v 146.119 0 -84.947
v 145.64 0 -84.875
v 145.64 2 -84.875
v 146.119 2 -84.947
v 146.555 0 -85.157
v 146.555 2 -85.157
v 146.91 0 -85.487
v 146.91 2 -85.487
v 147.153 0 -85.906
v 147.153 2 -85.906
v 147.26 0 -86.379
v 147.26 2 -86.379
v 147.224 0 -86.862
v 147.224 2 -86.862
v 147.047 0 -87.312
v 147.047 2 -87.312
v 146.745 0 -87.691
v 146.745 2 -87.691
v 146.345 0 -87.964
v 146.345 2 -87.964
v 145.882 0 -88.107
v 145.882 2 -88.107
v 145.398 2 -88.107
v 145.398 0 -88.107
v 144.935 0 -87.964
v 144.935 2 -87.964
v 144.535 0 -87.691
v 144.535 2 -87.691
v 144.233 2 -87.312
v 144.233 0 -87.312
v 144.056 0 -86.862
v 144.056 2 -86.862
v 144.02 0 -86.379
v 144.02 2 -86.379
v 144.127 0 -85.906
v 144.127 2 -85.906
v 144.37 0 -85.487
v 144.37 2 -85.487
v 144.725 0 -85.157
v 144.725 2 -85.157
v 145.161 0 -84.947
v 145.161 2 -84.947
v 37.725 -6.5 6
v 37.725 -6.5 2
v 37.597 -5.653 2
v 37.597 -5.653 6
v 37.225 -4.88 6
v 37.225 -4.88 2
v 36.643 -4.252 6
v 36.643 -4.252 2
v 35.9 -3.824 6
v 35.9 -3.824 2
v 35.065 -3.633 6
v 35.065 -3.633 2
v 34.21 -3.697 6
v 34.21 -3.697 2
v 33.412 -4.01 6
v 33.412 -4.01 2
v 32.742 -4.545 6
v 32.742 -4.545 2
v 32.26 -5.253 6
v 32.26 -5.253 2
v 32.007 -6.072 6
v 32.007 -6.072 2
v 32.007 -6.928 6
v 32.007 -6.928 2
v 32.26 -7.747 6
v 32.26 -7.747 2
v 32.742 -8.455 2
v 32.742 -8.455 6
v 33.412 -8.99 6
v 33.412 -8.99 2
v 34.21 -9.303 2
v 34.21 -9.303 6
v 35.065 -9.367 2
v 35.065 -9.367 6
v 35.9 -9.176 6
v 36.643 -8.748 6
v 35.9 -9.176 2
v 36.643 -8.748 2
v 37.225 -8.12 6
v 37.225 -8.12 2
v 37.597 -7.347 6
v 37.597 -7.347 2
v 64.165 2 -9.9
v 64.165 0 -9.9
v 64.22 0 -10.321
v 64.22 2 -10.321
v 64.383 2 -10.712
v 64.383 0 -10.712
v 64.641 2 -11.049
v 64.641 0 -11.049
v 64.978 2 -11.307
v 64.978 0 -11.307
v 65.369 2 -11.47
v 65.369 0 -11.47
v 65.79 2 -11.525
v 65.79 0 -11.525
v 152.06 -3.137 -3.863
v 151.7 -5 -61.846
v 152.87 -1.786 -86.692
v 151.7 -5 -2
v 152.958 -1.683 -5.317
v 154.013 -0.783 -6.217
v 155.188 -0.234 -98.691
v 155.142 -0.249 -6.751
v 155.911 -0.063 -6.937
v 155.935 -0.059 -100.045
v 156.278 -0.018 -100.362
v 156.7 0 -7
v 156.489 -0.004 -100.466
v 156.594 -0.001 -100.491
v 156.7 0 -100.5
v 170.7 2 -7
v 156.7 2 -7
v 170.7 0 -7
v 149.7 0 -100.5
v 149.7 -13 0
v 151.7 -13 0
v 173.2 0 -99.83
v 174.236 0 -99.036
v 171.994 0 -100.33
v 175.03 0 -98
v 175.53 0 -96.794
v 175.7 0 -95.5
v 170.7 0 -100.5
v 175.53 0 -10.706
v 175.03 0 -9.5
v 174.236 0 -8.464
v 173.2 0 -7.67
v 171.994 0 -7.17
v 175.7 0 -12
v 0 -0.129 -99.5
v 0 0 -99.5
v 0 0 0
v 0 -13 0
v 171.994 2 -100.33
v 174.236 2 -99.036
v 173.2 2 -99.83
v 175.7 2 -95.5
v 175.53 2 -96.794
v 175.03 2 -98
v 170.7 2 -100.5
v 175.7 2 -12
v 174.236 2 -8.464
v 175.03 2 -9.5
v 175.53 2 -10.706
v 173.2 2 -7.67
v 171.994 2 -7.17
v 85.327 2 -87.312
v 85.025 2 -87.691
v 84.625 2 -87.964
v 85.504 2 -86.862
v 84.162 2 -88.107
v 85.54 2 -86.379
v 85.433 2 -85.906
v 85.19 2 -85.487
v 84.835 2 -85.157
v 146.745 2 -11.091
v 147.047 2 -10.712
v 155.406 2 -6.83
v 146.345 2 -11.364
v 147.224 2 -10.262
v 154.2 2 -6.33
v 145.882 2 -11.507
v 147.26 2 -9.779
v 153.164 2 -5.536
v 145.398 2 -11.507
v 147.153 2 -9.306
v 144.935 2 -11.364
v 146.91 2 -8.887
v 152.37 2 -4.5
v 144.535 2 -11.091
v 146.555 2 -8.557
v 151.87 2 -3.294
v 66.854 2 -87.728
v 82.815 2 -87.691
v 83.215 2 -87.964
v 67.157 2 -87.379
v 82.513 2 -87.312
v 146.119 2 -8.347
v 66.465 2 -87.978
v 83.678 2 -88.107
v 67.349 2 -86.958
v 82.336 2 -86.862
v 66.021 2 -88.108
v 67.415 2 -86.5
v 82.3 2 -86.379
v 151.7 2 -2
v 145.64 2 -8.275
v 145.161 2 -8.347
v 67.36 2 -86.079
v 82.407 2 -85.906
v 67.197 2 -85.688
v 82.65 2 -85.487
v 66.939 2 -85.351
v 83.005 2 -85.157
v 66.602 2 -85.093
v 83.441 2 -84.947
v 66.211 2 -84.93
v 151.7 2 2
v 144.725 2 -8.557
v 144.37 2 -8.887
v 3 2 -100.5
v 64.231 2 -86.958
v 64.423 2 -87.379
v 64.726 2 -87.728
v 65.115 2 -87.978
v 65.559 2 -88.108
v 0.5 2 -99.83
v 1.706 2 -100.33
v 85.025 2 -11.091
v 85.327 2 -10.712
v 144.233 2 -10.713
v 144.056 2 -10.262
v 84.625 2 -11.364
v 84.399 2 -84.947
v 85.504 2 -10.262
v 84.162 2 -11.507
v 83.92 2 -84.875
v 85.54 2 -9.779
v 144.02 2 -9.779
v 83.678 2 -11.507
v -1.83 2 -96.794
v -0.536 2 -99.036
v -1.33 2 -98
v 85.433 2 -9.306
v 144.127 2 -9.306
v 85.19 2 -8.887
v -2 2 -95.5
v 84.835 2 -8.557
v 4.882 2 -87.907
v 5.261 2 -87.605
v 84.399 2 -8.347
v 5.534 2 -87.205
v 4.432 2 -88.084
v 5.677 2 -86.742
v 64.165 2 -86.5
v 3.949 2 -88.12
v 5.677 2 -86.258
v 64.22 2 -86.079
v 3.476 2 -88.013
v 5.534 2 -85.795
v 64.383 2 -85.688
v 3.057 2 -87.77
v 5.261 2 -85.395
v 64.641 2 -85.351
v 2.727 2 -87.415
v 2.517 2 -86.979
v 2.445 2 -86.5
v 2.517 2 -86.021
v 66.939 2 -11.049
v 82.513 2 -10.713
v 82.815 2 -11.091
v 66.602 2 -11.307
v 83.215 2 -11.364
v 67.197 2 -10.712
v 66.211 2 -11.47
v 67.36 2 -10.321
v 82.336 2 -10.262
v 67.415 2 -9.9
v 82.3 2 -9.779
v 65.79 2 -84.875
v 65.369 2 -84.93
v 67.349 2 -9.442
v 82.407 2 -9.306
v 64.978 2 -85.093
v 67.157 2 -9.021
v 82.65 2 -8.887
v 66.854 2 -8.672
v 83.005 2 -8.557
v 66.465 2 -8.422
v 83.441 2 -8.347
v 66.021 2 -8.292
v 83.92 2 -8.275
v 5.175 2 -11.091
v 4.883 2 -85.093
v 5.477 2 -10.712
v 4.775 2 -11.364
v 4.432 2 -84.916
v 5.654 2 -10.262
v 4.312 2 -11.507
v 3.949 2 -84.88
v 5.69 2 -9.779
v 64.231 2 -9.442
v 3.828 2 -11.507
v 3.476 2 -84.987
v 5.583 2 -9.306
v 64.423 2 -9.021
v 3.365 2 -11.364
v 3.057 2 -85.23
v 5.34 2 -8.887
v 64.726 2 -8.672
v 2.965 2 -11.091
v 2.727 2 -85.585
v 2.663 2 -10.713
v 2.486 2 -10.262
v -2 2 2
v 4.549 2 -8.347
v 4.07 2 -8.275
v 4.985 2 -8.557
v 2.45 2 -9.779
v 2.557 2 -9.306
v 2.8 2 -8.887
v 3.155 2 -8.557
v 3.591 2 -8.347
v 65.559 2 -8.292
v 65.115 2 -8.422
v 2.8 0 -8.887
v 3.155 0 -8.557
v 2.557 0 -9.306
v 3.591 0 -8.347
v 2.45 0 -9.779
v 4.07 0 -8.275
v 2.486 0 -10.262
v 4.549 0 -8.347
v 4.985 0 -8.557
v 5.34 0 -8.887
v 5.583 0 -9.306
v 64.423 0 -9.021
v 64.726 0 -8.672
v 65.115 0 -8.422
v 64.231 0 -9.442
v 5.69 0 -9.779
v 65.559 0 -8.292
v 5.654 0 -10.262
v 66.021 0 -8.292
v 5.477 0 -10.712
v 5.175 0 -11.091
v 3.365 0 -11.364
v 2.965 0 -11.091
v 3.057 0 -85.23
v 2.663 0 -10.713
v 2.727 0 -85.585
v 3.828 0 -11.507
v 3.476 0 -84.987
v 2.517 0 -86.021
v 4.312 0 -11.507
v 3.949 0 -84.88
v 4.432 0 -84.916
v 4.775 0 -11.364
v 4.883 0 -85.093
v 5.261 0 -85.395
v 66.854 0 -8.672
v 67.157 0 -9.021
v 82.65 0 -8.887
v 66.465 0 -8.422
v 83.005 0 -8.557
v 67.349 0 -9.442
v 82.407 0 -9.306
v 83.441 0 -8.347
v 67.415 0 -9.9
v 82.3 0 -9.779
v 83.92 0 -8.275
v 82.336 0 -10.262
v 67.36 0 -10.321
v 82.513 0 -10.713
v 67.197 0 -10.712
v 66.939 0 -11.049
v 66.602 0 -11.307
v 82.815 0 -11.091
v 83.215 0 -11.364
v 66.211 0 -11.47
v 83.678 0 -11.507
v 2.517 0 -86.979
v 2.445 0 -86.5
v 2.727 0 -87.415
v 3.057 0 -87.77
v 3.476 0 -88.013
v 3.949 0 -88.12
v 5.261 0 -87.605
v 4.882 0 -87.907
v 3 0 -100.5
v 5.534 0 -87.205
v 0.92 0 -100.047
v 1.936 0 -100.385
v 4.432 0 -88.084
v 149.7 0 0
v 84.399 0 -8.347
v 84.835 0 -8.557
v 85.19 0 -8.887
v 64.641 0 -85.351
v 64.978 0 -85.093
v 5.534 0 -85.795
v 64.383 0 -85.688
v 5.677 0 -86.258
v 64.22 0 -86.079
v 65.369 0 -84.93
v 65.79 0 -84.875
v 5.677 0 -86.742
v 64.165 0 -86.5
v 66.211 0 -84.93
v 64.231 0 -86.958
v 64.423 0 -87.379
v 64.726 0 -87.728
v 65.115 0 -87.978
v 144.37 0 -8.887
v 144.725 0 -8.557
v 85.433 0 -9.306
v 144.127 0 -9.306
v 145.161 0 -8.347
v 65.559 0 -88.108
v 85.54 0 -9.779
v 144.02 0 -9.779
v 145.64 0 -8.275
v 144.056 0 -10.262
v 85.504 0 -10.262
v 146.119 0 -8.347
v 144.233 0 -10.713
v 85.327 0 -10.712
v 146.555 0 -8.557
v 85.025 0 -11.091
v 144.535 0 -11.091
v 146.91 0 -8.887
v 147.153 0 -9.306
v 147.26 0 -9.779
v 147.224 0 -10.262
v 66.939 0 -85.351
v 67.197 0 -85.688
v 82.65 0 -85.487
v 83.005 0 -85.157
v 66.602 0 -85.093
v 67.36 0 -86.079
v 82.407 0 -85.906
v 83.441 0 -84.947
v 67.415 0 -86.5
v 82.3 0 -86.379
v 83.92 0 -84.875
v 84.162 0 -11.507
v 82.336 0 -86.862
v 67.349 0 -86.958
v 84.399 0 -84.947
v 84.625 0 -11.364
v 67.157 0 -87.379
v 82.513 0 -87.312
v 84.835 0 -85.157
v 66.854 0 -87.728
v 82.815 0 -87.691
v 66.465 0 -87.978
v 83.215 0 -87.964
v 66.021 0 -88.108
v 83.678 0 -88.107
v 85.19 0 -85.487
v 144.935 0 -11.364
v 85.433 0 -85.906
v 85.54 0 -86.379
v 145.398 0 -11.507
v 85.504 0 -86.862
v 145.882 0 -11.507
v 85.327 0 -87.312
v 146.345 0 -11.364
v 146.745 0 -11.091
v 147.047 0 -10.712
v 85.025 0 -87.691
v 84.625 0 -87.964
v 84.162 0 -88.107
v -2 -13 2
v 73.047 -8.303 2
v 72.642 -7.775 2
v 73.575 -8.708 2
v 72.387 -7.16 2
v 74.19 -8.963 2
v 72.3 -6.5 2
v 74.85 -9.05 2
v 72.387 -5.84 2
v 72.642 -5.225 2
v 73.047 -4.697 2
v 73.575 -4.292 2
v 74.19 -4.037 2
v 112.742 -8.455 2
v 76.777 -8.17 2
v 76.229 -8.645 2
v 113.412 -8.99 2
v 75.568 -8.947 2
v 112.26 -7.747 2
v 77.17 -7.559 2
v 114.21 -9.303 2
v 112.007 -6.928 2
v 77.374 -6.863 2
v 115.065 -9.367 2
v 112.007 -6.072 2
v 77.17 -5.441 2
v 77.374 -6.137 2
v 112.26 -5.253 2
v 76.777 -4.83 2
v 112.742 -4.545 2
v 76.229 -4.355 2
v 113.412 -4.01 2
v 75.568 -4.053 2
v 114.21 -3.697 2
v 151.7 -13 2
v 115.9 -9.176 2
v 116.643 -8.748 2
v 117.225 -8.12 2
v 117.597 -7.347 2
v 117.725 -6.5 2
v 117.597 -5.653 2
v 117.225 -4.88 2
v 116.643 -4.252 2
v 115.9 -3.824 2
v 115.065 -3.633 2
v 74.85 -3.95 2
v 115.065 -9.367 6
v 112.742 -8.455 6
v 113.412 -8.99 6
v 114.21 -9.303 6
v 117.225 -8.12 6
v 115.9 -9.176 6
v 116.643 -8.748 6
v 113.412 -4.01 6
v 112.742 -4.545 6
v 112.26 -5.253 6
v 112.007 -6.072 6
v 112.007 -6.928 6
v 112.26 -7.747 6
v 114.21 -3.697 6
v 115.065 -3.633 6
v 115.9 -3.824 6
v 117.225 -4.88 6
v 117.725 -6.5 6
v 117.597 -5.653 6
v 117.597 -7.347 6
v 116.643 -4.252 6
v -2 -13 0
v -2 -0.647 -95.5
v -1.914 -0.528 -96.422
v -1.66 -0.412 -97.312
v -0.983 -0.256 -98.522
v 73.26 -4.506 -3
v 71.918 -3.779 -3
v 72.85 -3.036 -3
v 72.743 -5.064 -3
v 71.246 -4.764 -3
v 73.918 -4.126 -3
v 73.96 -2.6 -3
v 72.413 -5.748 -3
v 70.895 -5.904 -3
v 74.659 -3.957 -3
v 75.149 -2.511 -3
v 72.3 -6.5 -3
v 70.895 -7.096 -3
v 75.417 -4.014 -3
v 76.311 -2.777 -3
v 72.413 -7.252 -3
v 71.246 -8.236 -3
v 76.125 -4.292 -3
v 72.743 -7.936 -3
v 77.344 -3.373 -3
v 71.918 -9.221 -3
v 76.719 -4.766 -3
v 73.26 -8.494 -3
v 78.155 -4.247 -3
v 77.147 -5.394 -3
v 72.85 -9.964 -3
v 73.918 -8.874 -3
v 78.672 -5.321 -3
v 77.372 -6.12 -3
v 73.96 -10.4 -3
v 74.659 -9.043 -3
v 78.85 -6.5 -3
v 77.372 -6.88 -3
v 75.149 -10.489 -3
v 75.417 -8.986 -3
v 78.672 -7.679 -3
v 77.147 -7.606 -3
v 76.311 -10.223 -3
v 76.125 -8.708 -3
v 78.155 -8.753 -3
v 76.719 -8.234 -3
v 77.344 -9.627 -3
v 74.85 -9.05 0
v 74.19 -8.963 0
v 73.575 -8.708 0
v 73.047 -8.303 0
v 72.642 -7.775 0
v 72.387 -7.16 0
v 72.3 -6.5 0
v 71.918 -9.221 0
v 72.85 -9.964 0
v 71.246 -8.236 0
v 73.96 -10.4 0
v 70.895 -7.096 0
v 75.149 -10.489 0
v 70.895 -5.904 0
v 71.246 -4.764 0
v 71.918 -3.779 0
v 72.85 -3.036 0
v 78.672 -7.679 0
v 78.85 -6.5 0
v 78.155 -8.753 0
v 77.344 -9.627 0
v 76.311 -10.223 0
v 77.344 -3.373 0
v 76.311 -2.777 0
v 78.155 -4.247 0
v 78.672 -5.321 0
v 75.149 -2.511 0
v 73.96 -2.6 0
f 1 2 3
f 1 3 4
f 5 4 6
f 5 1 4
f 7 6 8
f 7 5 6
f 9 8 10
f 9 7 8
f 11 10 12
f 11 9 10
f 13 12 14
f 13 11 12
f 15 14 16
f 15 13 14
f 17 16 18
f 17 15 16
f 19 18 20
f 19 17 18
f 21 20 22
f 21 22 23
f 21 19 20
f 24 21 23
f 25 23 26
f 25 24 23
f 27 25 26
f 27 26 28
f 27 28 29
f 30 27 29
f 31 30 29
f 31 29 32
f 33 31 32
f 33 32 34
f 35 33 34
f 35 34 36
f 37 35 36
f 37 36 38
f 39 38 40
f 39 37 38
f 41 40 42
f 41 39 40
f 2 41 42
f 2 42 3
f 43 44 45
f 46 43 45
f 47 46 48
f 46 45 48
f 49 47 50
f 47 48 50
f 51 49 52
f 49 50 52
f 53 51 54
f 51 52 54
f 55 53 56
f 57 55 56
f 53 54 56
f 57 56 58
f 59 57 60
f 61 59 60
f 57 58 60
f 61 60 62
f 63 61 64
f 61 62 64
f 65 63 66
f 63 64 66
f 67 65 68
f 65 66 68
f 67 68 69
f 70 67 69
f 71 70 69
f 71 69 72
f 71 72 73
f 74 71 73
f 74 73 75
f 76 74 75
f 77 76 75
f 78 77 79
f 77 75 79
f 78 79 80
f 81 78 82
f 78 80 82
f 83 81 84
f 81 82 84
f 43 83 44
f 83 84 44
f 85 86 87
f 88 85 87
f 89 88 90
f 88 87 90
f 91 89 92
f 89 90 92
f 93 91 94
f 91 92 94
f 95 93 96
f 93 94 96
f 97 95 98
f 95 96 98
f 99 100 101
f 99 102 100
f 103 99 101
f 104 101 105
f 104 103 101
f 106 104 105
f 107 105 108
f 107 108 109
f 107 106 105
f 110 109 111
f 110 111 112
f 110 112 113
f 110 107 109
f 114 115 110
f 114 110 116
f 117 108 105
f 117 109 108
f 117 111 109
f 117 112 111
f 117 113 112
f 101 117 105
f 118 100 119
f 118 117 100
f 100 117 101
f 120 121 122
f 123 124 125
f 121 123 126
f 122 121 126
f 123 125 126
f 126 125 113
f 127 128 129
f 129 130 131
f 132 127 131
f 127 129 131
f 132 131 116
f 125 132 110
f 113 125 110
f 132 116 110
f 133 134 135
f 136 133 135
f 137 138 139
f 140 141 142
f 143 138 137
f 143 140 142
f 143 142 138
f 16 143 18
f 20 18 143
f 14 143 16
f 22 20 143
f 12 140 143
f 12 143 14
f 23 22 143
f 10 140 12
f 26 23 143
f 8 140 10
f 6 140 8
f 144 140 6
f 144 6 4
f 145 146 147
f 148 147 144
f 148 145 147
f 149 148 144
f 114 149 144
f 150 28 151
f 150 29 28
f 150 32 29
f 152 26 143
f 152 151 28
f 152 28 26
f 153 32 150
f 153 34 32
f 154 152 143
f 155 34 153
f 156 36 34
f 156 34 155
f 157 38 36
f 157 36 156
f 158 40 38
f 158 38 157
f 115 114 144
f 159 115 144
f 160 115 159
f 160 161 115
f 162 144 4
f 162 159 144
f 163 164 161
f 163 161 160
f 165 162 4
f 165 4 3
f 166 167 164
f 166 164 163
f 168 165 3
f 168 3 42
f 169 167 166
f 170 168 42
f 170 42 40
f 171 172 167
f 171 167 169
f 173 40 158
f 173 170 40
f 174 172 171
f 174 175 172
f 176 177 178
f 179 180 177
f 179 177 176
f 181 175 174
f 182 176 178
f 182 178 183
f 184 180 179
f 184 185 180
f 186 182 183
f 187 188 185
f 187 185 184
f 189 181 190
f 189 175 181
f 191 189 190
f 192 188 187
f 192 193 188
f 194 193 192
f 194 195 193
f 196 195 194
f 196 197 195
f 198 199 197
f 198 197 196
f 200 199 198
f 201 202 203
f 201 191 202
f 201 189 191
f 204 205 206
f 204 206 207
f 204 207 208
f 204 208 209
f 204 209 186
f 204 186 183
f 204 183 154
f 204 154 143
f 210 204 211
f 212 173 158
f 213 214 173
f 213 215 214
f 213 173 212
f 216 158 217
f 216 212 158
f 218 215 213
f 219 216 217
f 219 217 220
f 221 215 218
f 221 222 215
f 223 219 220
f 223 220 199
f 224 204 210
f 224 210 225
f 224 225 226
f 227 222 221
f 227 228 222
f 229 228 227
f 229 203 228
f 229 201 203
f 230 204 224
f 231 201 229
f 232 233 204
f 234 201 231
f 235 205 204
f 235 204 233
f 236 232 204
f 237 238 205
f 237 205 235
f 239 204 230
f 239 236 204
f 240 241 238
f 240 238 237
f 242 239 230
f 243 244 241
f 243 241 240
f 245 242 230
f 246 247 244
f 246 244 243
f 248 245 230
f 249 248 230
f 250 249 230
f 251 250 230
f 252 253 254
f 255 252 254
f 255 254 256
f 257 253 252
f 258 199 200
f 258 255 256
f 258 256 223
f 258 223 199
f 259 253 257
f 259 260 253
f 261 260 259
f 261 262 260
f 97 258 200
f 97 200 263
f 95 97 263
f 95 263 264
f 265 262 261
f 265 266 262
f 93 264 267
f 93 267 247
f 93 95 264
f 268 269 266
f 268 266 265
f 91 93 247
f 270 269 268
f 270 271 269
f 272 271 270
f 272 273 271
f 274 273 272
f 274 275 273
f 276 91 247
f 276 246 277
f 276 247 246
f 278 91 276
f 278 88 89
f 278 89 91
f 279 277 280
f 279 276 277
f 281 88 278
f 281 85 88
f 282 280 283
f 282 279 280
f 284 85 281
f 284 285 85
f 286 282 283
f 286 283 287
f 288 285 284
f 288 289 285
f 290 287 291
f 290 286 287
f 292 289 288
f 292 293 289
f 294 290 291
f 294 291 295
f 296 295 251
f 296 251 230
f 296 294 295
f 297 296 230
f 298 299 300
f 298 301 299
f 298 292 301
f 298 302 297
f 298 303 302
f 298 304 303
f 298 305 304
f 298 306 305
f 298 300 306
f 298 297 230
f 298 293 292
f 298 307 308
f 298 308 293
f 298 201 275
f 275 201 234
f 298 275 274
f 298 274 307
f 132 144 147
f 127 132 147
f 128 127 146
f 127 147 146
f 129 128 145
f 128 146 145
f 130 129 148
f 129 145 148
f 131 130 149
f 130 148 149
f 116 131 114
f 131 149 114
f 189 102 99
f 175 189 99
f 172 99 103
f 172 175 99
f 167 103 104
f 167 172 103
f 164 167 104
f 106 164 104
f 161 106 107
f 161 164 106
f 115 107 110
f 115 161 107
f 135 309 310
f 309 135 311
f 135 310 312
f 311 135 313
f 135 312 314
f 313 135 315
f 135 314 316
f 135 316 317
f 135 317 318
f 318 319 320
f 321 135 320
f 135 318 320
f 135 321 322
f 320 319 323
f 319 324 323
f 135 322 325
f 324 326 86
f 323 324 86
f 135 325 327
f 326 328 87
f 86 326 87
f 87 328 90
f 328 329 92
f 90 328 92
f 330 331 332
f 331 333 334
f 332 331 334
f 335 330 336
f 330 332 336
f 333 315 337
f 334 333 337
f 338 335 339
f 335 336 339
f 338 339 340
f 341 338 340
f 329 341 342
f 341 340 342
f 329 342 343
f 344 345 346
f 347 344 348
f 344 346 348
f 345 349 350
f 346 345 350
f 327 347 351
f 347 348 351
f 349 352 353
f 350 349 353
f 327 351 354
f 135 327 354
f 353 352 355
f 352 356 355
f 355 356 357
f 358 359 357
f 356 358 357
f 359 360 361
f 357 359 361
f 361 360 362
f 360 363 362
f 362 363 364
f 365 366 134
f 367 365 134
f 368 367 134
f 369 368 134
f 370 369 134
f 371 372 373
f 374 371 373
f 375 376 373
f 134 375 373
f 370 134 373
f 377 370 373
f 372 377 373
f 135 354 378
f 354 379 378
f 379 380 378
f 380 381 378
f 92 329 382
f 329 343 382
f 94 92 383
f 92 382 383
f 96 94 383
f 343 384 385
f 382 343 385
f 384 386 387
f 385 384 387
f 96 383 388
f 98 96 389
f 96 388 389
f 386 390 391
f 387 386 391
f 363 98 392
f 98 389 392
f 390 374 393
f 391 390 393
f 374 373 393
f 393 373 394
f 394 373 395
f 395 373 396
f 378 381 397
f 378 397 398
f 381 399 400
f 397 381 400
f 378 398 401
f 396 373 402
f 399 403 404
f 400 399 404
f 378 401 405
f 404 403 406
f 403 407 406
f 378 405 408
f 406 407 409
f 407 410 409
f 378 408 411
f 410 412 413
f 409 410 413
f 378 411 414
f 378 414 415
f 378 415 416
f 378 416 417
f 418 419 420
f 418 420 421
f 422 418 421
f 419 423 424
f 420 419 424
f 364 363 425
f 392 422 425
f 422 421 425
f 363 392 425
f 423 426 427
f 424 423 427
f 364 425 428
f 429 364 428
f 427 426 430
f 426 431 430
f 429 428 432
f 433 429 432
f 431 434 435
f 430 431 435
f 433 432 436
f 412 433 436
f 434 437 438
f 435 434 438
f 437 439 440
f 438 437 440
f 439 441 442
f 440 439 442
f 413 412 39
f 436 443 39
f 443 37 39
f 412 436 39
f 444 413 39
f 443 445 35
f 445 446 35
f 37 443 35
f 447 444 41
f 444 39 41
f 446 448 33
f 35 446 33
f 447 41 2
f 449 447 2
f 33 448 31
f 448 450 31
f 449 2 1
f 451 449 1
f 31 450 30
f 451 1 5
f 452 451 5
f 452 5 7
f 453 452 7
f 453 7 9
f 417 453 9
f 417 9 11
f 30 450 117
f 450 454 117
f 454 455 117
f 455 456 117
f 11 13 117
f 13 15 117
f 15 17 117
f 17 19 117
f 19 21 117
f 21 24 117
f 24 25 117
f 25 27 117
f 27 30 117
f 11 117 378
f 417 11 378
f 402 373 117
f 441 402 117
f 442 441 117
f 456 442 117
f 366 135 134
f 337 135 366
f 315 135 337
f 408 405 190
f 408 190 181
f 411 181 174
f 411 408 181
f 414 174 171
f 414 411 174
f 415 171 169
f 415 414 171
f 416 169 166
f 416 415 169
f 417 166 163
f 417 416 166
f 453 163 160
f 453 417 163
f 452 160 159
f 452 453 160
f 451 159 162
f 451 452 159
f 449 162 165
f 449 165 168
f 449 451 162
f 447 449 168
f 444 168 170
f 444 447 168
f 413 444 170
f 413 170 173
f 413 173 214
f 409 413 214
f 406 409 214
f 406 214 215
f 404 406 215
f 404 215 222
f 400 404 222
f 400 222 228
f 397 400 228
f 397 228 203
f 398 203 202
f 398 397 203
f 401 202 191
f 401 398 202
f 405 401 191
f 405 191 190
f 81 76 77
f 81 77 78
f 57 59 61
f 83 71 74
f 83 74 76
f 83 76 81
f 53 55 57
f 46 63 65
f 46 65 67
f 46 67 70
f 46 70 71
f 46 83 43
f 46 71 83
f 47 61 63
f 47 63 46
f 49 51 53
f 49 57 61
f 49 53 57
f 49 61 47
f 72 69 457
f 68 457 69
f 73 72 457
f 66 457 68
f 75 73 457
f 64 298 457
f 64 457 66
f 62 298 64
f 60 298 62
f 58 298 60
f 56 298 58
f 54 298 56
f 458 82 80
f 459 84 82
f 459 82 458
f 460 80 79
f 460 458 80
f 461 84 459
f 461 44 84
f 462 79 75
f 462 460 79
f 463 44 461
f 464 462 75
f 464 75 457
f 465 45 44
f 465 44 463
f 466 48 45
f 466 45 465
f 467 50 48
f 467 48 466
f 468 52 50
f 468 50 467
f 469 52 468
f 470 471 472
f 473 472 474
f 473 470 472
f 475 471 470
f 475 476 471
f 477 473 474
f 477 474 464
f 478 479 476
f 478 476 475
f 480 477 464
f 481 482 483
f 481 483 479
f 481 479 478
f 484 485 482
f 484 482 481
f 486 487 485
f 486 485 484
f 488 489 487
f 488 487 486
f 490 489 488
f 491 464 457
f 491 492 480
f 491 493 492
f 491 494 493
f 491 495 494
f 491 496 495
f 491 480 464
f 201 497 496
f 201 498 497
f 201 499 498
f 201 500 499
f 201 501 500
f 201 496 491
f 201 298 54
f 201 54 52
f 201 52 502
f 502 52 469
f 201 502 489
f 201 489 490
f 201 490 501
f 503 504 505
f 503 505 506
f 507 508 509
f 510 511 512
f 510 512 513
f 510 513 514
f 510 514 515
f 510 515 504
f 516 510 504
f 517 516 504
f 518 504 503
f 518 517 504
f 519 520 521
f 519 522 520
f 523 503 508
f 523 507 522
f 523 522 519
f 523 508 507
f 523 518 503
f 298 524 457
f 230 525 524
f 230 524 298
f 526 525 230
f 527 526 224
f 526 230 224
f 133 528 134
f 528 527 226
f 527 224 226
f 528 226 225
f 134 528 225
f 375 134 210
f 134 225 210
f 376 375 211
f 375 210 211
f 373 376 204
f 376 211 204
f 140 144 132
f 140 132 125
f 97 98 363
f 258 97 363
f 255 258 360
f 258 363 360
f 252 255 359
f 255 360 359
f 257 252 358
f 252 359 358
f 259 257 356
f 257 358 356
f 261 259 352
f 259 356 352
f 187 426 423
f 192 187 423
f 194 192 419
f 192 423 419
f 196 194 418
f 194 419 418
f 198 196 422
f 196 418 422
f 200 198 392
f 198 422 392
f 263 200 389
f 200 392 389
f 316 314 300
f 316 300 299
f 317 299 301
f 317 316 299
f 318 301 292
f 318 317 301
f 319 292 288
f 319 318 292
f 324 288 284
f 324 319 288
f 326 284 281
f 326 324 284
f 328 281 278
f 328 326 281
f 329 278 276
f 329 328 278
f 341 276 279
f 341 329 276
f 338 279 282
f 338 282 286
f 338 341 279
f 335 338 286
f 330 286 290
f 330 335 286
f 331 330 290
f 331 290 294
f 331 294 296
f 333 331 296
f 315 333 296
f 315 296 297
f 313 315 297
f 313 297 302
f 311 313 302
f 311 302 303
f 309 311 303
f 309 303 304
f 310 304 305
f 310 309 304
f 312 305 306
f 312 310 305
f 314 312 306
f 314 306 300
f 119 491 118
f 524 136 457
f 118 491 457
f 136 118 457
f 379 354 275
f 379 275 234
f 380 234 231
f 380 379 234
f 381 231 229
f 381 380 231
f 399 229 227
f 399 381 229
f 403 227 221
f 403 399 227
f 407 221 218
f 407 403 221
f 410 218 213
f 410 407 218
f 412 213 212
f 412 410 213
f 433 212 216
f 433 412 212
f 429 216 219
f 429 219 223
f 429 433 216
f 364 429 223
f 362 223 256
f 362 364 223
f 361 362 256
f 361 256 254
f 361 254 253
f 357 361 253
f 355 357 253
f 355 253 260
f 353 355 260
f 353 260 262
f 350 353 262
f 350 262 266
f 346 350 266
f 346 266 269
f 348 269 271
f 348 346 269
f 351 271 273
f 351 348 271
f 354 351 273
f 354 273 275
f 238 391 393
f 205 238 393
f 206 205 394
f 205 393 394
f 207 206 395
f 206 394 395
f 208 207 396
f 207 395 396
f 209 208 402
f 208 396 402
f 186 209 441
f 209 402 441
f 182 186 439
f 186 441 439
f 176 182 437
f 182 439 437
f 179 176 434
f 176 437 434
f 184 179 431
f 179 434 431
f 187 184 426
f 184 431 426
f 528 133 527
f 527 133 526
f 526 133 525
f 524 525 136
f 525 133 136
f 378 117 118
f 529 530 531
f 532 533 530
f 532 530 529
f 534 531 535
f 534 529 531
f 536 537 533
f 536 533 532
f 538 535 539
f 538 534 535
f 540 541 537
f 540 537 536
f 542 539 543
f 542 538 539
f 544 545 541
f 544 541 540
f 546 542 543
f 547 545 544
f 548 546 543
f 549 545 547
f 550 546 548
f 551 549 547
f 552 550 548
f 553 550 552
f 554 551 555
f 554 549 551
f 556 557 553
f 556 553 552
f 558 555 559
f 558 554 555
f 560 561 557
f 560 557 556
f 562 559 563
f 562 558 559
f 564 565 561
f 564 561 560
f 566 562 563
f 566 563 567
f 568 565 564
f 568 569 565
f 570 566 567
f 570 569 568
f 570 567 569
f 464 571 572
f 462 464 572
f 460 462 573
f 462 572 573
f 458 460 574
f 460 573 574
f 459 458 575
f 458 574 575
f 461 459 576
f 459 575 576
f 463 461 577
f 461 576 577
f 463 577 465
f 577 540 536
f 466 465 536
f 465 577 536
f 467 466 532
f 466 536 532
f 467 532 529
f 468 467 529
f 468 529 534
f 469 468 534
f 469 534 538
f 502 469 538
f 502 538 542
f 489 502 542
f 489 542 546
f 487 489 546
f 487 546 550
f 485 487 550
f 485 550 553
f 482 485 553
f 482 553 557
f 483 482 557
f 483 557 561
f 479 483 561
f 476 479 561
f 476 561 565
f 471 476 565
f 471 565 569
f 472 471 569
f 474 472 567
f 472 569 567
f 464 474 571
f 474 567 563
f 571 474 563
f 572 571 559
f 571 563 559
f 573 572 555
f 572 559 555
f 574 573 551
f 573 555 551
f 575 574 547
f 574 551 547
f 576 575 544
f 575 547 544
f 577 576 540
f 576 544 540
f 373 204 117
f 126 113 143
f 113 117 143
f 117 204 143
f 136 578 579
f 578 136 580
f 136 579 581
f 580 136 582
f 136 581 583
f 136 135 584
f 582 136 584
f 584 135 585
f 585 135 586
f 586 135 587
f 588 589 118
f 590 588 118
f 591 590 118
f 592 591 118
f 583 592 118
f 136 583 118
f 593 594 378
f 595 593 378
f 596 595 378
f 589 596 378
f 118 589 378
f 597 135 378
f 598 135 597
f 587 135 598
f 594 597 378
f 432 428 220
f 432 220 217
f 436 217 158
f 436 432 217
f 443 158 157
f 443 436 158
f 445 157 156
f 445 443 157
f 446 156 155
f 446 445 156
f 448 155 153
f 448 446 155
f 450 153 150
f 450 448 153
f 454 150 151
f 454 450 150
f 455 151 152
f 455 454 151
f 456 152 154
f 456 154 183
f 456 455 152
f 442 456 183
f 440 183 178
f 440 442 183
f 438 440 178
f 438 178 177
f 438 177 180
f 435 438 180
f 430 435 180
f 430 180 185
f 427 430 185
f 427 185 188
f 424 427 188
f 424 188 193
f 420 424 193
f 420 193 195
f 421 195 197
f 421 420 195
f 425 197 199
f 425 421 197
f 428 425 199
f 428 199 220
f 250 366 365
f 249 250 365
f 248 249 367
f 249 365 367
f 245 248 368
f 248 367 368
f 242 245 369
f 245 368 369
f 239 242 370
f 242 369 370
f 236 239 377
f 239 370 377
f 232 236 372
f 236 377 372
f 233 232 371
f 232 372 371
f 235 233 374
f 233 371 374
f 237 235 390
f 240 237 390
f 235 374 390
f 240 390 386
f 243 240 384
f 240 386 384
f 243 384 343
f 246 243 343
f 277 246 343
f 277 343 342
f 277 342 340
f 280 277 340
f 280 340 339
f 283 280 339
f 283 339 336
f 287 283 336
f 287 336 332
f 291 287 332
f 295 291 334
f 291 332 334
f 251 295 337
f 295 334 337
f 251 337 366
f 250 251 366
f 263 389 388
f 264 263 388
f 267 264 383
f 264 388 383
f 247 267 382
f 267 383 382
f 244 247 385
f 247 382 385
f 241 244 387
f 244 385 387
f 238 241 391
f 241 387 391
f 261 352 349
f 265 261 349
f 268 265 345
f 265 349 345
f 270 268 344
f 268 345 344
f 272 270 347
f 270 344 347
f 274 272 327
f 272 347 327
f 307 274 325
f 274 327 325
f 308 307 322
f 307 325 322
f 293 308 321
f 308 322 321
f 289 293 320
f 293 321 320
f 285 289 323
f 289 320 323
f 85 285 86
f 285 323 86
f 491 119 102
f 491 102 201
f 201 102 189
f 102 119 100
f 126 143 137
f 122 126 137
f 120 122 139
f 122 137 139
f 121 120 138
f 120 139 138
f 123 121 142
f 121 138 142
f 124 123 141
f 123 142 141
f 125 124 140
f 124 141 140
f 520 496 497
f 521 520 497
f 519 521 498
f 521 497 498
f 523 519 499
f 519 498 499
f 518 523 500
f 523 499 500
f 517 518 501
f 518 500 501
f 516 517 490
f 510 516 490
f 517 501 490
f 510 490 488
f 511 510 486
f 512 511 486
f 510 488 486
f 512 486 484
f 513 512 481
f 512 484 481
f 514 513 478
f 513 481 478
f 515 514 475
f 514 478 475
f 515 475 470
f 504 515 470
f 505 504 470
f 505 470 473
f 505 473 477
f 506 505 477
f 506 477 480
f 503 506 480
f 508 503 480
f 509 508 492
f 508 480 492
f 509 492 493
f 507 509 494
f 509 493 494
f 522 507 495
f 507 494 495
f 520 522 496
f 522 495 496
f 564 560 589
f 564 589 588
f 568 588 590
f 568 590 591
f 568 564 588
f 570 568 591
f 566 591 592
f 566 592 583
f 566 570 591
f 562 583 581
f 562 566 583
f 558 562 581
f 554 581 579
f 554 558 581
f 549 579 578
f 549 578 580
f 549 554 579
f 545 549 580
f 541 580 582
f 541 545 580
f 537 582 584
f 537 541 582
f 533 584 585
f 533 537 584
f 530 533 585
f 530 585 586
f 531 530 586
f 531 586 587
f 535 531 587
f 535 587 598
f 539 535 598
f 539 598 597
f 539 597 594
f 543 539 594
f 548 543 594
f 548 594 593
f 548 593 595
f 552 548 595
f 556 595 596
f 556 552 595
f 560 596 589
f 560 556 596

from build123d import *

# Parameters (mm, degrees)
SKETCH1_W           = 10
SKETCH1_H           = 100.5
SKETCH1_R           = 1.625
SKETCH1_W_2         = 69.85
BOSS_EXTRUDE1_DEPTH = 2
SKETCH3_W           = 149.7
SKETCH3_H           = 2
BOSS_EXTRUDE2_DEPTH = 2
SKETCH4_W           = 100.5
SKETCH4_H           = 2
BOSS_EXTRUDE3_DEPTH = 2
BOSS_EXTRUDE4_DEPTH = 2
SKETCH6_W           = 8
SKETCH6_H           = 15
BOSS_EXTRUDE5_DEPTH = 3
CUT_EXTRUDE1_DEPTH  = 10
FILLET1_R           = 3
CUT_EXTRUDE2_DEPTH  = 10
BOSS_EXTRUDE6_START = 3
SKETCH10_R          = 4
SKETCH10_R_2        = 2.55
BOSS_EXTRUDE6_DEPTH = 3
SKETCH12_R          = 2.875
BOSS_EXTRUDE7_DEPTH = 4
SKETCH13_W          = 10.946886228
SKETCH13_H          = 17.580383234
SKETCH13_W_2        = 10.296538922
SKETCH13_H_2        = 23.433508982
CUT_EXTRUDE3_DEPTH  = 43
SKETCH15_W          = 24
SKETCH15_H          = 93.5
BOSS_EXTRUDE8_DEPTH = 2
FILLET2_R           = 5
FILLET3_R           = 5


with BuildPart() as part:
    # Sketch1 → Boss-Extrude1 (new body)
    # profile 1 of 3: a face of its own
    with BuildSketch(Plane(origin=(0, 0, 0), x_dir=(1, 0, 0), z_dir=(0, 1, 0))):
        with Locations((74.85, 50.25)):
            Rectangle(SKETCH1_W, SKETCH1_H)
    # profile 2 of 3: a face of its own
    with BuildSketch(Plane(origin=(0, 0, 0), x_dir=(1, 0, 0), z_dir=(0, 1, 0))):
        Polygon((0, 0), (69.85, 0), (69.85, 100.5), (0, 100.5), (0, 86.5), align=None)
        with Locations(Location((4.07, 9.9, 0), (0, 0, 270))):
            Circle(SKETCH1_R, mode=Mode.SUBTRACT)
        with BuildLine():
            ThreePointArc((64.165, 9.9), (64.640951481, 11.049048519), (65.79, 11.525))
            ThreePointArc((65.79, 11.525), (66.939048519, 11.049048519), (67.415, 9.9))
            ThreePointArc((67.415, 9.9), (65.79, 8.275), (64.165, 9.9))
        make_face(mode=Mode.SUBTRACT)
        with BuildLine():
            ThreePointArc((5.695, 86.5), (4.07, 84.875), (2.445, 86.5))
            ThreePointArc((2.445, 86.5), (4.07, 88.125), (5.695, 86.5))
        make_face(mode=Mode.SUBTRACT)
        with BuildLine():
            ThreePointArc((65.79, 84.875), (64.640951481, 85.350951481), (64.165, 86.5))
            ThreePointArc((64.165, 86.5), (65.79, 88.125), (67.415, 86.5))
            ThreePointArc((67.415, 86.5), (66.939048519, 85.350951481), (65.79, 84.875))
        make_face(mode=Mode.SUBTRACT)
    # profile 3 of 3: a face of its own
    with BuildSketch(Plane(origin=(0, 0, 0), x_dir=(1, 0, 0), z_dir=(0, 1, 0))):
        with Locations((114.775, 50.25)):
            Rectangle(SKETCH1_W_2, SKETCH1_H)
        with Locations(Location((83.92, 9.9, 0), (0, 0, 270))):
            Circle(SKETCH1_R, mode=Mode.SUBTRACT)
        with Locations(Location((145.64, 9.9, 0), (0, 0, 270))):
            Circle(SKETCH1_R, mode=Mode.SUBTRACT)
        with Locations(Location((83.92, 86.5, 0), (0, 0, 270))):
            Circle(SKETCH1_R, mode=Mode.SUBTRACT)
        with Locations(Location((145.64, 86.5, 0), (0, 0, 270))):
            Circle(SKETCH1_R, mode=Mode.SUBTRACT)
    extrude(amount=BOSS_EXTRUDE1_DEPTH)

    # Sketch3 → Boss-Extrude2 (add)
    with BuildSketch(Plane.XY):
        Polygon((-10, 2), (-10, -13), (159.7, -13), (159.7, 2), (149.7, 2), (149.7, 0), (0, 0), (0, 2), align=None)
        with Locations((74.85, 1)):
            Rectangle(SKETCH3_W, SKETCH3_H)
    extrude(amount=BOSS_EXTRUDE2_DEPTH)

    # Sketch4 → Boss-Extrude3 (add)
    with BuildSketch(Plane.ZY):
        Polygon((0, 0), (-100.5, 0), (0, -13), align=None)
        with Locations((-50.25, 1)):
            Rectangle(SKETCH4_W, SKETCH4_H)
    extrude(amount=BOSS_EXTRUDE3_DEPTH)

    # Sketch5 → Boss-Extrude4 (add)
    with BuildSketch(Plane(origin=(149.7, 0, 0), x_dir=(0, 0, -1), z_dir=(1, 0, 0))):
        Polygon((100.5, 0), (0, -13), (0, 2), (100.5, 2), align=None)
    extrude(amount=BOSS_EXTRUDE4_DEPTH)

    # Sketch6 → Boss-Extrude5 (add)
    with BuildSketch(Plane(origin=(0, 0, 0), x_dir=(-1, 0, 0), z_dir=(0, 0, -1))):
        with Locations((6, -5.5)):
            Rectangle(SKETCH6_W, SKETCH6_H)
        with Locations((-155.7, -5.5)):
            Rectangle(SKETCH6_W, SKETCH6_H)
    extrude(amount=BOSS_EXTRUDE5_DEPTH)

    # Sketch8 → Cut-Extrude1 (cut)
    with BuildSketch(Plane(origin=(0, 0, -3), x_dir=(-1, 0, 0), z_dir=(0, 0, -1))):
        with BuildLine():
            ThreePointArc((-153.15, -5.5), (-155.7, -2.95), (-158.25, -5.5))
            Line((-158.25, -5.5), (-153.15, -5.5))
        make_face()
        with BuildLine():
            Line((-153.15, -5.5), (-158.25, -5.5))
            ThreePointArc((-158.25, -5.5), (-155.7, -8.05), (-153.15, -5.5))
        make_face()
        with BuildLine():
            ThreePointArc((3.45, -5.5), (6, -8.05), (8.55, -5.5))
            Line((8.55, -5.5), (3.45, -5.5))
        make_face()
        with BuildLine():
            Line((3.45, -5.5), (8.55, -5.5))
            ThreePointArc((8.55, -5.5), (6, -2.95), (3.45, -5.5))
        make_face()
    extrude(amount=-CUT_EXTRUDE1_DEPTH, mode=Mode.SUBTRACT)

    # Fillet1
    fillet1_edges = [part.edges().sort_by_distance(p)[0] for p in [
        (159.7, 2, -0.5),
        (-10, 2, -0.5),
        (-10, -13, -0.5),
        (159.7, -13, -0.5),
    ]]
    fillet(fillet1_edges, radius=FILLET1_R)

    # Sketch9 → Cut-Extrude2 (cut)
    with BuildSketch(Plane(origin=(0, 0, 0), x_dir=(-1, 0, 0), z_dir=(0, 0, -1))):
        with BuildLine():
            ThreePointArc((-72.3, -6.5), (-73.046877708, -4.696877708), (-74.85, -3.95))
            Line((-74.85, -3.95), (-74.85, -9.05))
            ThreePointArc((-74.85, -9.05), (-73.046877708, -8.303122292), (-72.3, -6.5))
        make_face()
        with BuildLine():
            Line((-74.85, -9.05), (-74.85, -3.95))
            ThreePointArc((-74.85, -3.95), (-77.4, -6.5), (-74.85, -9.05))
        make_face()
    extrude(amount=-CUT_EXTRUDE2_DEPTH, mode=Mode.SUBTRACT)

    # Sketch10 → Boss-Extrude6 (add)
    with BuildSketch(Plane(origin=(0, 0, 0), x_dir=(-1, 0, 0), z_dir=(0, 0, -1)).offset(BOSS_EXTRUDE6_START)):
        with Locations(Location((-74.85, -6.5, 0), (0, 0, 180))):
            Circle(SKETCH10_R)
        with Locations((-74.85, -6.5)):
            Circle(SKETCH10_R_2, mode=Mode.SUBTRACT)
    extrude(amount=-BOSS_EXTRUDE6_DEPTH)

    # Sketch12 → Boss-Extrude7 (add)
    with BuildSketch(Plane.XY.offset(2)):
        with Locations((34.85, -6.5)):
            Circle(SKETCH12_R)
        with Locations((114.85, -6.5)):
            Circle(SKETCH12_R)
    extrude(amount=BOSS_EXTRUDE7_DEPTH)

    # Sketch13 → Cut-Extrude3 (cut)
    with BuildSketch(Plane(origin=(0, 0, -3), x_dir=(-1, 0, 0), z_dir=(0, 0, -1))):
        with Locations((-157.173443114, -6.790191617)):
            Rectangle(SKETCH13_W, SKETCH13_H)
        with Locations((7.148269461, -9.716754491)):
            Rectangle(SKETCH13_W_2, SKETCH13_H_2)
    extrude(amount=-CUT_EXTRUDE3_DEPTH, mode=Mode.SUBTRACT)

    # Sketch15 → Boss-Extrude8 (add)
    with BuildSketch(Plane(origin=(0, 2, 0), x_dir=(1, 0, 0), z_dir=(0, 1, 0))):
        with Locations((163.7, 53.75)):
            Rectangle(SKETCH15_W, SKETCH15_H)
    extrude(amount=-BOSS_EXTRUDE8_DEPTH)

    # Fillet2
    # the kernel refuses this fillet: 5 mm, written as the material it adds along each edge
    with BuildSketch(Plane(origin=(151.7, 2, -7), x_dir=(1, 0, 0), z_dir=(0, -1, 0))) as fillet2_piece_1:
        with BuildLine():
            CenterArc((FILLET2_R, FILLET2_R), FILLET2_R, 180, 90)
            Line((0, FILLET2_R), (0, 0))
            Line((0, 0), (FILLET2_R, 0))
        make_face()
    extrude(amount=2)
    # the kernel refuses this fillet: 5 mm, written as the material it takes off along each edge
    with BuildSketch(Plane(origin=(175.7, 14.5, -100.5), x_dir=(-1, 0, 0), z_dir=(0, -1, 0)), Plane(origin=(175.7, 14.5, -7), x_dir=(0, 0, -1), z_dir=(0, -1, 0))) as fillet2_2_piece_1:
        with BuildLine():
            CenterArc((FILLET2_R, -FILLET2_R), FILLET2_R, 90, 90)
            Line((0, -FILLET2_R), (0, 0))
            Line((0, 0), (FILLET2_R, 0))
        make_face()
    extrude(amount=27, mode=Mode.SUBTRACT)
    with BuildSketch(Plane(origin=(-2, 14.5, -100.5), x_dir=(1, 0, 0), z_dir=(0, -1, 0))) as fillet2_2_piece_2:
        with BuildLine():
            CenterArc((FILLET2_R, FILLET2_R), FILLET2_R, 180, 90)
            Line((0, FILLET2_R), (0, 0))
            Line((0, 0), (FILLET2_R, 0))
        make_face()
    extrude(amount=27, mode=Mode.SUBTRACT)

    # Fillet3
    fillet3_edges = [part.edges().sort_by_distance(p)[0] for p in [
        (151.7, 0, -51.25),
    ]]
    fillet(fillet3_edges, radius=FILLET3_R)


solid = part.part
